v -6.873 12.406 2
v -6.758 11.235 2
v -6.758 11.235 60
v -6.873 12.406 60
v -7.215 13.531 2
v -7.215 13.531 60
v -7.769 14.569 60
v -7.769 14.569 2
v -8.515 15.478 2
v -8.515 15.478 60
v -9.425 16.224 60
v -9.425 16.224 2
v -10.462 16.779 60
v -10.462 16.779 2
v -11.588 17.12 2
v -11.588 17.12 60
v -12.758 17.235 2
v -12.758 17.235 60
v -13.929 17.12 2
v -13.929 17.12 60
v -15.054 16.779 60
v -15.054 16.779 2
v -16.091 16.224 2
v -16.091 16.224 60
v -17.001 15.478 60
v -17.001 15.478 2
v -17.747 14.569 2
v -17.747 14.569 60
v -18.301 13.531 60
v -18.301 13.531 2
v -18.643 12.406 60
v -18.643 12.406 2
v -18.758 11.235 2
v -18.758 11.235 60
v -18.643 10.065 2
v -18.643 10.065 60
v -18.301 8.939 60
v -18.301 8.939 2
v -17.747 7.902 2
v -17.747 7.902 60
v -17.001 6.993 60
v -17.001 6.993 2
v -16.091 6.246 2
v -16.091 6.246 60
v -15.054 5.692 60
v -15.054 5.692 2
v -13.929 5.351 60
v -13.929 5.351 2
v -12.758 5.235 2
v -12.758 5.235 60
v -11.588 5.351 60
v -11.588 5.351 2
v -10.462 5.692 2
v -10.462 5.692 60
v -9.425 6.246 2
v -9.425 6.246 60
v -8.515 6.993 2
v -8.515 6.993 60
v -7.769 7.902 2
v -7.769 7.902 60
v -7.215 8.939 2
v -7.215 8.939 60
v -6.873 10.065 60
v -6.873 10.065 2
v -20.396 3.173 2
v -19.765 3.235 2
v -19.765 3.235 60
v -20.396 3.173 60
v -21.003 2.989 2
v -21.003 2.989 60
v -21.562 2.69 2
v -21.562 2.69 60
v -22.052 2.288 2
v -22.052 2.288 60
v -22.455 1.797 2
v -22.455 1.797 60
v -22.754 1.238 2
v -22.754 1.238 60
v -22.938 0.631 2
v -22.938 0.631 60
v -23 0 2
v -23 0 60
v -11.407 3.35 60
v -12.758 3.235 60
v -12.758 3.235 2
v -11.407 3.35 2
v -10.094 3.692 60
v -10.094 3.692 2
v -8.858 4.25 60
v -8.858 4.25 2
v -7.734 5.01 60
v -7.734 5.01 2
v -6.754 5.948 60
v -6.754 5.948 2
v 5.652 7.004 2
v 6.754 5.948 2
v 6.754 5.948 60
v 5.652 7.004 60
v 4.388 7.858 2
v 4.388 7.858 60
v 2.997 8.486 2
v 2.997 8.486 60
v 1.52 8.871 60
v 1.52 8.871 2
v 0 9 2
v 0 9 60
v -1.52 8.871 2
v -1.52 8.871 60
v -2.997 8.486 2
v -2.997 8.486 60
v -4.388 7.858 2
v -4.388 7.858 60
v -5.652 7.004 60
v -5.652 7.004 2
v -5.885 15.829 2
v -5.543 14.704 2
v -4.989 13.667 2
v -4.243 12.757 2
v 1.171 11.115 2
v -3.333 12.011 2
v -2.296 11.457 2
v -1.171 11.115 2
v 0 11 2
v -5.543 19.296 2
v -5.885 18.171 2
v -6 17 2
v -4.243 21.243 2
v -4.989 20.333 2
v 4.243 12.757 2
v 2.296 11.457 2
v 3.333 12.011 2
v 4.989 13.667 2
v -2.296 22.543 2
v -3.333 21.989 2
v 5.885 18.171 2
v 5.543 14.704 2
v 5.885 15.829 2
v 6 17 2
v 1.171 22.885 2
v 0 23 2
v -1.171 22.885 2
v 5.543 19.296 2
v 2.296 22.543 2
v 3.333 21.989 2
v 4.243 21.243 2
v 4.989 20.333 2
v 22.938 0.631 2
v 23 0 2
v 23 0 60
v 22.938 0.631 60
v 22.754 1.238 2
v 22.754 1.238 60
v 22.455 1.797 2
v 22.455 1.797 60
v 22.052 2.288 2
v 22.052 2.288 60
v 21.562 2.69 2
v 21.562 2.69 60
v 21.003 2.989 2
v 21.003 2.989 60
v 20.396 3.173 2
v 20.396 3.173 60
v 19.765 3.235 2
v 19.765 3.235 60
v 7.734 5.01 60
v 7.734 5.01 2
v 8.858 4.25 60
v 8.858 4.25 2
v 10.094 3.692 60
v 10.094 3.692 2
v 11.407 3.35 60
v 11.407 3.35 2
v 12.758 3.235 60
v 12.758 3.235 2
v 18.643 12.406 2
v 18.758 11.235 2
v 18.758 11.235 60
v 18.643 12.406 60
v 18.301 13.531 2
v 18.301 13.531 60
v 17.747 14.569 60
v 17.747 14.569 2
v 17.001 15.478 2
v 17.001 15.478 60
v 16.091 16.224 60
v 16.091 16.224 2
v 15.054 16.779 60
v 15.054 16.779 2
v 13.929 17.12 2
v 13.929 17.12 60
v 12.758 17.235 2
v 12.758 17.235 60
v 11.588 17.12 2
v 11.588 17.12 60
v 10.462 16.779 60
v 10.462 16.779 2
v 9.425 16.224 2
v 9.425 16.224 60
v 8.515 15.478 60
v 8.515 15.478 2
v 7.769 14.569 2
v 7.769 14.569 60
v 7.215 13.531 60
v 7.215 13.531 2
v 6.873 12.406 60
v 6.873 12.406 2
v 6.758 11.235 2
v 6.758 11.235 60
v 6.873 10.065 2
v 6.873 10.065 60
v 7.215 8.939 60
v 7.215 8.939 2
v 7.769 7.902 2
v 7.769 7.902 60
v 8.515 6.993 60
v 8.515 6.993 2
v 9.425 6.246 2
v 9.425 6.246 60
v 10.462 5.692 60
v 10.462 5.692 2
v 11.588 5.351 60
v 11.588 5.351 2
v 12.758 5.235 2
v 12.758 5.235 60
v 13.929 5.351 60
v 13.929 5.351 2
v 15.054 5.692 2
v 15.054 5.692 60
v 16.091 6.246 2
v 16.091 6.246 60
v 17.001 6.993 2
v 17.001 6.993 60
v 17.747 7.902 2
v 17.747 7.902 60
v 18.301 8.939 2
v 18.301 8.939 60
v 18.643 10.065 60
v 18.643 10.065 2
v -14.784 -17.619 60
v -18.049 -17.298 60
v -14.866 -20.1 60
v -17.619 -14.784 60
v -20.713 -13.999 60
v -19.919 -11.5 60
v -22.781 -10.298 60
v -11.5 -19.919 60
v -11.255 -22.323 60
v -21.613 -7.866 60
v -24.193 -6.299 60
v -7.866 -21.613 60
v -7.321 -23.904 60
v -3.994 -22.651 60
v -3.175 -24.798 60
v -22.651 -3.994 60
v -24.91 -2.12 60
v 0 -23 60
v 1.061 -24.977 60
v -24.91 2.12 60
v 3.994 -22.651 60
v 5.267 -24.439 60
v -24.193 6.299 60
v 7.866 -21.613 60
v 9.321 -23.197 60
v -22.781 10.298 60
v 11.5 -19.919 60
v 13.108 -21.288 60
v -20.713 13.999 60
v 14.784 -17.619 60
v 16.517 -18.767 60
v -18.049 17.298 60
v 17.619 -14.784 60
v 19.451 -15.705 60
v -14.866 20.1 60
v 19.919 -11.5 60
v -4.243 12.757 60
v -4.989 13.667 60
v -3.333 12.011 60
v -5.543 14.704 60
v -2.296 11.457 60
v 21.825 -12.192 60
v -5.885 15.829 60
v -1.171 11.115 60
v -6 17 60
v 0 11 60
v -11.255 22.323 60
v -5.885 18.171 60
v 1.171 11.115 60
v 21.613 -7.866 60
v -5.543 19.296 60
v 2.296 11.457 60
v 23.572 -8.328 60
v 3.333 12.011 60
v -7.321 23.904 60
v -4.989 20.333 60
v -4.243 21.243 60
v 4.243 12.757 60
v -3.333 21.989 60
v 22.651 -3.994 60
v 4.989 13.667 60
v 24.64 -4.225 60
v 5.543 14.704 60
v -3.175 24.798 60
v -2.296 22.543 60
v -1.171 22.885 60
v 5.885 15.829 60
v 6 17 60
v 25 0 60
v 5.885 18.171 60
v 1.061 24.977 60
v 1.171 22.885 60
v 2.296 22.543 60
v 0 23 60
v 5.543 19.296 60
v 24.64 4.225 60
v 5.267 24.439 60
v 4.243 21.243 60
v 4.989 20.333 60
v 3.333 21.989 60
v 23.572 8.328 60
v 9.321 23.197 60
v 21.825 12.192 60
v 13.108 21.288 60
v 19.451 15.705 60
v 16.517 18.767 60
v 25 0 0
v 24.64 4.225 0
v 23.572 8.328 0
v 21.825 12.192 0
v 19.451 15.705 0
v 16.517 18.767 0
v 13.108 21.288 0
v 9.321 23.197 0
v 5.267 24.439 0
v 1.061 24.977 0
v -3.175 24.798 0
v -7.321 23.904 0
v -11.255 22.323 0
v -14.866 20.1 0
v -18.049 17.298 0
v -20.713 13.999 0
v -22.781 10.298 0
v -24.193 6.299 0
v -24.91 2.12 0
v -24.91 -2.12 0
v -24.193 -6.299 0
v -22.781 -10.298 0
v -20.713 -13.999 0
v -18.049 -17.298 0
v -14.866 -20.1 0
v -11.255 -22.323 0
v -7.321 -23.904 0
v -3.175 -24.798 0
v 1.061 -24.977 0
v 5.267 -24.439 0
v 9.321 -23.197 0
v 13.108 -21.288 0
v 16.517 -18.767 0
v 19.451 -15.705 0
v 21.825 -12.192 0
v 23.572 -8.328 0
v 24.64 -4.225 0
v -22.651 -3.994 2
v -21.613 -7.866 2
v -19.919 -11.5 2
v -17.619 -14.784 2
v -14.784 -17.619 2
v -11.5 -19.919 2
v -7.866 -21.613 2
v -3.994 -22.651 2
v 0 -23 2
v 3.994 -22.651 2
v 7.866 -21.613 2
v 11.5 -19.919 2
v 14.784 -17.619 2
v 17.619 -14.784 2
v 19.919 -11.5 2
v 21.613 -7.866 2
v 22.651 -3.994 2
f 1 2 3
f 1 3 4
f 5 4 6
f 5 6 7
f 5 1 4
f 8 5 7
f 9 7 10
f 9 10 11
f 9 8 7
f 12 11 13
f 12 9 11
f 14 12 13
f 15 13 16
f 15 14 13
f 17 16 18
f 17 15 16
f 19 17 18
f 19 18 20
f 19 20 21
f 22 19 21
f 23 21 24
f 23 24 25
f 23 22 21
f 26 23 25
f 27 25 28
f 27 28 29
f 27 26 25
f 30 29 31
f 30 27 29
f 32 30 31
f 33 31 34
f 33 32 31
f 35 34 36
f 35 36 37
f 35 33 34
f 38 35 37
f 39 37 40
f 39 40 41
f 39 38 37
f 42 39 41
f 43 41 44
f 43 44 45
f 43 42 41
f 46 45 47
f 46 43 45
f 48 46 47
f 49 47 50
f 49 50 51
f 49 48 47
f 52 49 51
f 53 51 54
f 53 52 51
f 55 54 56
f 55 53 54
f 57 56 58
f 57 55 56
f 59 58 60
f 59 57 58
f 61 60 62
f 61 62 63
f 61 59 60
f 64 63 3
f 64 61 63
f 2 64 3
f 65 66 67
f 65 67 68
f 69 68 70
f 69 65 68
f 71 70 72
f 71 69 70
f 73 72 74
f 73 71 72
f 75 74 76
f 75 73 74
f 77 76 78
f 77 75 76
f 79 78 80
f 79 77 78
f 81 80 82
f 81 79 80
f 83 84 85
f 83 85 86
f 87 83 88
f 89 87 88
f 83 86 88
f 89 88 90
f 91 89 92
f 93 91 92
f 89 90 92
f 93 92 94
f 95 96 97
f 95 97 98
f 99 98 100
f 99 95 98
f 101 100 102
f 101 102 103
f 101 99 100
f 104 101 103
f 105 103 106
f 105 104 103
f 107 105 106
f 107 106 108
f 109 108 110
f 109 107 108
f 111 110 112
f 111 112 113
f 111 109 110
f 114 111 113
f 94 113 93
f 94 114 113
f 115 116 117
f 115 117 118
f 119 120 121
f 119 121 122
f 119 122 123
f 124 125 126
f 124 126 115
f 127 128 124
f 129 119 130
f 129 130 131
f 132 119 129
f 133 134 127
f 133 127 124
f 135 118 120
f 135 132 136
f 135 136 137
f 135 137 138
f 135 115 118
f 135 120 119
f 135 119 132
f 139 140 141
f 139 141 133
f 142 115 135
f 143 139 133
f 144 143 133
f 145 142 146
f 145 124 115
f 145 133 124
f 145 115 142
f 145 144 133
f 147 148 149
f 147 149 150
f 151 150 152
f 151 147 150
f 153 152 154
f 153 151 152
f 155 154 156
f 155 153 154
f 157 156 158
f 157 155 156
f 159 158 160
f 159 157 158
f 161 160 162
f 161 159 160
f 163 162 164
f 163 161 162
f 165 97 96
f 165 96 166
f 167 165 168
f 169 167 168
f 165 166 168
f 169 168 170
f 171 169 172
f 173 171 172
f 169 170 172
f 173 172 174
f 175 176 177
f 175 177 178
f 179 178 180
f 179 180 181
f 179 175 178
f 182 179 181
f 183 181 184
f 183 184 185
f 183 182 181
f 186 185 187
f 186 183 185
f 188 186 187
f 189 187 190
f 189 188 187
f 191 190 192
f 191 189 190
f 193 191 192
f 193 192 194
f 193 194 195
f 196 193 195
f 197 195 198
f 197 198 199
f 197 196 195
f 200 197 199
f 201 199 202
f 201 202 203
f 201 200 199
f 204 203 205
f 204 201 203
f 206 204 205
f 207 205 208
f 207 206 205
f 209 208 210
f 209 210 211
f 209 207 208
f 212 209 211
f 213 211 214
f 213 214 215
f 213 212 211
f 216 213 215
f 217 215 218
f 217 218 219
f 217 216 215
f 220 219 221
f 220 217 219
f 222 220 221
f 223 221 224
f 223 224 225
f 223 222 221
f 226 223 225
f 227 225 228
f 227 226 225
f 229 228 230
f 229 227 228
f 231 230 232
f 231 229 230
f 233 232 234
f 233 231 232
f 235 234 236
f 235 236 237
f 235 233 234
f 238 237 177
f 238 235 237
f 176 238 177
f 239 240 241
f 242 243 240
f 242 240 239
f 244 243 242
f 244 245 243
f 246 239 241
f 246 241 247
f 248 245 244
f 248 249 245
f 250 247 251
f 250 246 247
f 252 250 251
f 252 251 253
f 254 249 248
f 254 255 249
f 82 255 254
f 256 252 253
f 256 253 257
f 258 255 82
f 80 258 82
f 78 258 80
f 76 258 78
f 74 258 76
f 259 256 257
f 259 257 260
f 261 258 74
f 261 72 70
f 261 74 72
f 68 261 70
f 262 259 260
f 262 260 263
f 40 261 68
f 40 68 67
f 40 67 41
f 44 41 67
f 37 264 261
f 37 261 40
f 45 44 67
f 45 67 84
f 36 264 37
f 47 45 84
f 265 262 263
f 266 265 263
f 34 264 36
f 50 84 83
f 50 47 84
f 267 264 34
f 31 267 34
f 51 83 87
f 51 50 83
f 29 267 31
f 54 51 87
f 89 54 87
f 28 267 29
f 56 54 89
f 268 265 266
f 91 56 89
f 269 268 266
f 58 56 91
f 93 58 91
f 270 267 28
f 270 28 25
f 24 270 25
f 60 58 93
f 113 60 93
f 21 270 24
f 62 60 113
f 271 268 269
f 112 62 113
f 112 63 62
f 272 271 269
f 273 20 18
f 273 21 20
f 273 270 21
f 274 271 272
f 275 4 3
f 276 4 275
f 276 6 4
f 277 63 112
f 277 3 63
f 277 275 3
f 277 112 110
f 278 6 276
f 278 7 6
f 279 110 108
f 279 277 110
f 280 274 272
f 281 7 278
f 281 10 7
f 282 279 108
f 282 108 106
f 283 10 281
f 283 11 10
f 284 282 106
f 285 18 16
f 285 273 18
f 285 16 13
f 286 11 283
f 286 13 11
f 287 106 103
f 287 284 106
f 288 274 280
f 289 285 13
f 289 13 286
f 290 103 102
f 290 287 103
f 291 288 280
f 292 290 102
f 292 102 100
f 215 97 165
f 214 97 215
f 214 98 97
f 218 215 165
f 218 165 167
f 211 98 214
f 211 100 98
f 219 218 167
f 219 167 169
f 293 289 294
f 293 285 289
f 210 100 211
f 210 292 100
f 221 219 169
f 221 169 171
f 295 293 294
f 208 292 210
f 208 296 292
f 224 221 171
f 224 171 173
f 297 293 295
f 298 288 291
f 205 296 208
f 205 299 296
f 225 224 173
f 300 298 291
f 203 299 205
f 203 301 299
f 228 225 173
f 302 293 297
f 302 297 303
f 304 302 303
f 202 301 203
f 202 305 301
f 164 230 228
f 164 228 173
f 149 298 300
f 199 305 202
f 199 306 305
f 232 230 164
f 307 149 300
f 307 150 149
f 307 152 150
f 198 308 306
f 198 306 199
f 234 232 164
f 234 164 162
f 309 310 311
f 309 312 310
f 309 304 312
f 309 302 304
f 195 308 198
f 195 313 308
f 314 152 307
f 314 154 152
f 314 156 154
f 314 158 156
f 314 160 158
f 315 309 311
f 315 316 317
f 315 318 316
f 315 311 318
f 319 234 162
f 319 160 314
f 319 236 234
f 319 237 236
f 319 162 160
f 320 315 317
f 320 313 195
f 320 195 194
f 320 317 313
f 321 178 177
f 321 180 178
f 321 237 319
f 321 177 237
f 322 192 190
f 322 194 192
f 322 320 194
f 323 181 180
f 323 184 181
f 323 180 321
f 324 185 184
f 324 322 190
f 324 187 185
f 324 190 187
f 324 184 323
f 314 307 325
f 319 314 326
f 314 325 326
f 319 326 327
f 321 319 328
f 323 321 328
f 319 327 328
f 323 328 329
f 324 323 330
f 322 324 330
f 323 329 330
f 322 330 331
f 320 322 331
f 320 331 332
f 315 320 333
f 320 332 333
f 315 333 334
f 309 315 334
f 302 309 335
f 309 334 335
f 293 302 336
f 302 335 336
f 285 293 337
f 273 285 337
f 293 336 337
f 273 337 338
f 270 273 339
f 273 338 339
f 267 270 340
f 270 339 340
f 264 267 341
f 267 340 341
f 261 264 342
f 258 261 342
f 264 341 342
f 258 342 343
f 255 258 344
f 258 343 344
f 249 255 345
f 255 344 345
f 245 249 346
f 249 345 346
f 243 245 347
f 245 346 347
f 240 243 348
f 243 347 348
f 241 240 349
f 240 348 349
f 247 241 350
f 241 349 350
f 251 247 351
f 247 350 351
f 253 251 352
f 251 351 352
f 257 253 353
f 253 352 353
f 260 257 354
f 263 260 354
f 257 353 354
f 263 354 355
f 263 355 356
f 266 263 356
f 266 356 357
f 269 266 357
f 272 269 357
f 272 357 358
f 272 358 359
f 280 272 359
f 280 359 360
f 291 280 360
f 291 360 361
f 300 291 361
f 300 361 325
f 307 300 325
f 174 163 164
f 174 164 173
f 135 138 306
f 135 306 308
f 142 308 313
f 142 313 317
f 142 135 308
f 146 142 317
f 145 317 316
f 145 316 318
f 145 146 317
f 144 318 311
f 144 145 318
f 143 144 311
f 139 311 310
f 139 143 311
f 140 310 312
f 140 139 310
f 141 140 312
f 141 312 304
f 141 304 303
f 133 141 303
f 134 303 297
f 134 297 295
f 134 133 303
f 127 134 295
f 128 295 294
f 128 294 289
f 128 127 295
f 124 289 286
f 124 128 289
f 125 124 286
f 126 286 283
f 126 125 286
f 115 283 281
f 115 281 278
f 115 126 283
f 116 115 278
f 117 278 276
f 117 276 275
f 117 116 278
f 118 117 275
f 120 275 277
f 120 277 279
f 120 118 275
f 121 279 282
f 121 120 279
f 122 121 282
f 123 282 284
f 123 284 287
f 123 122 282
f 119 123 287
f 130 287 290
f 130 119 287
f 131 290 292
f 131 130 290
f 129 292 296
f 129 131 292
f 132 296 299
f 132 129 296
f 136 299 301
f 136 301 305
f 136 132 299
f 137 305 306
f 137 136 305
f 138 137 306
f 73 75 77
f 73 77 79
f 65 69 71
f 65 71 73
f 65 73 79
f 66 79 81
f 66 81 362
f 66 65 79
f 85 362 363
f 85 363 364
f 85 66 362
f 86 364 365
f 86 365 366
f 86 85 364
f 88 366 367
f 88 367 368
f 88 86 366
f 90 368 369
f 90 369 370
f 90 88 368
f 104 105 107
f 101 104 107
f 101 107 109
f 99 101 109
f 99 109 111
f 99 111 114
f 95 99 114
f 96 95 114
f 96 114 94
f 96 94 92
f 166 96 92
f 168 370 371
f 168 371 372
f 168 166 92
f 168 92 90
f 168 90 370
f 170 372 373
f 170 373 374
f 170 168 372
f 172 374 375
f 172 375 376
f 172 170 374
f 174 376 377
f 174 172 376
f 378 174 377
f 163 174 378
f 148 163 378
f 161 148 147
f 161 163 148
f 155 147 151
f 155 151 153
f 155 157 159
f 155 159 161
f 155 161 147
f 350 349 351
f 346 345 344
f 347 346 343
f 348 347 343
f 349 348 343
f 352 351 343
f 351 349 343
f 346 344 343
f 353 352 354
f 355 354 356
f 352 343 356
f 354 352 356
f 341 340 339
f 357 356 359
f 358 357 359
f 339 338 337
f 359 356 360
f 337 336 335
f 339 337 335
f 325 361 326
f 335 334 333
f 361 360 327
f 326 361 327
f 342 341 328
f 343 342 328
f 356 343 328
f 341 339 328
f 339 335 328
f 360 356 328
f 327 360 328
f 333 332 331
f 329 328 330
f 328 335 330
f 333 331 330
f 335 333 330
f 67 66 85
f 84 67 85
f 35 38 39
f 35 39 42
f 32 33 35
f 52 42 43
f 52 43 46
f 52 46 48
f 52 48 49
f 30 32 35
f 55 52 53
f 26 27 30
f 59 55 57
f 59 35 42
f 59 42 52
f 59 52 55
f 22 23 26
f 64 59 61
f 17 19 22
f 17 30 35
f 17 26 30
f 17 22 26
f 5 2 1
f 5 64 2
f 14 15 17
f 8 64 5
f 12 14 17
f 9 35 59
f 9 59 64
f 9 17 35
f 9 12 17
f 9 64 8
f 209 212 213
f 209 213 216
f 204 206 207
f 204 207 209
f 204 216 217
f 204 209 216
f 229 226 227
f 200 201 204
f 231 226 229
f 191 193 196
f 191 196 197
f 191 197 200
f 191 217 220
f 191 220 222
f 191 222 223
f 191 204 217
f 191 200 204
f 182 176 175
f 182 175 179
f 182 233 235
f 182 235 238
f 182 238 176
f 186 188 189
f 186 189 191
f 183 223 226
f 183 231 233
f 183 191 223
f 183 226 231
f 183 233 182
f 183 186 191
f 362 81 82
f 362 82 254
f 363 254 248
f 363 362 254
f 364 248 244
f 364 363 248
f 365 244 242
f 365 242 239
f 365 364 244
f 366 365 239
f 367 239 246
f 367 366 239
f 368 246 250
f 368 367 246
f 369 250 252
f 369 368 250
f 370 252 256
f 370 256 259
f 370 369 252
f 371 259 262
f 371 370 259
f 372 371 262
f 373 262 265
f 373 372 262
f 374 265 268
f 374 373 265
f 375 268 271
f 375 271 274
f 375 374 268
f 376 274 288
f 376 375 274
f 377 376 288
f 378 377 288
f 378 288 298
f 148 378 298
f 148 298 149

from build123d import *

# Parameters (mm, degrees)
SKETCH_R      = 25
PAD_DEPTH     = 2
SKETCH002_R   = 25
SKETCH002_R_2 = 6
PAD001_DEPTH  = 58


with BuildPart() as part:
    # Sketch → Pad (new body)
    with BuildSketch(Plane.XY):
        Circle(SKETCH_R)
    extrude(amount=PAD_DEPTH)

    # Sketch002 (on Face3 of Pad) → Pad001 (join)
    with BuildSketch(Plane.XY.offset(2)):
        Circle(SKETCH002_R)
        with Locations((0, 17)):
            Circle(SKETCH002_R_2, mode=Mode.SUBTRACT)
        with Locations((-12.758063, 11.235294)):
            Circle(SKETCH002_R_2, mode=Mode.SUBTRACT)
        with Locations((12.758063, 11.235294)):
            Circle(SKETCH002_R_2, mode=Mode.SUBTRACT)
        with BuildLine():
            ThreePointArc((-23, 0), (0, -23), (23, 0))
            ThreePointArc((23, 0), (22.052404, 2.287698), (19.764706, 3.235294))
            Line((19.764706, 3.235294), (12.758063, 3.235294))
            ThreePointArc((6.754269, 5.948097), (9.463945, 3.944973), (12.758063, 3.235294))
            ThreePointArc((6.754269, 5.948097), (3.705882, 8.201612), (0, 9))
            ThreePointArc((0, 9), (-3.705882, 8.201612), (-6.754269, 5.948097))
            ThreePointArc((-12.758063, 3.235294), (-9.463945, 3.944973), (-6.754269, 5.948097))
            Line((-19.764706, 3.235294), (-12.758063, 3.235294))
            ThreePointArc((-19.764706, 3.235294), (-22.052404, 2.287698), (-23, 0))
        make_face(mode=Mode.SUBTRACT)
    extrude(amount=PAD001_DEPTH)


solid = part.part
